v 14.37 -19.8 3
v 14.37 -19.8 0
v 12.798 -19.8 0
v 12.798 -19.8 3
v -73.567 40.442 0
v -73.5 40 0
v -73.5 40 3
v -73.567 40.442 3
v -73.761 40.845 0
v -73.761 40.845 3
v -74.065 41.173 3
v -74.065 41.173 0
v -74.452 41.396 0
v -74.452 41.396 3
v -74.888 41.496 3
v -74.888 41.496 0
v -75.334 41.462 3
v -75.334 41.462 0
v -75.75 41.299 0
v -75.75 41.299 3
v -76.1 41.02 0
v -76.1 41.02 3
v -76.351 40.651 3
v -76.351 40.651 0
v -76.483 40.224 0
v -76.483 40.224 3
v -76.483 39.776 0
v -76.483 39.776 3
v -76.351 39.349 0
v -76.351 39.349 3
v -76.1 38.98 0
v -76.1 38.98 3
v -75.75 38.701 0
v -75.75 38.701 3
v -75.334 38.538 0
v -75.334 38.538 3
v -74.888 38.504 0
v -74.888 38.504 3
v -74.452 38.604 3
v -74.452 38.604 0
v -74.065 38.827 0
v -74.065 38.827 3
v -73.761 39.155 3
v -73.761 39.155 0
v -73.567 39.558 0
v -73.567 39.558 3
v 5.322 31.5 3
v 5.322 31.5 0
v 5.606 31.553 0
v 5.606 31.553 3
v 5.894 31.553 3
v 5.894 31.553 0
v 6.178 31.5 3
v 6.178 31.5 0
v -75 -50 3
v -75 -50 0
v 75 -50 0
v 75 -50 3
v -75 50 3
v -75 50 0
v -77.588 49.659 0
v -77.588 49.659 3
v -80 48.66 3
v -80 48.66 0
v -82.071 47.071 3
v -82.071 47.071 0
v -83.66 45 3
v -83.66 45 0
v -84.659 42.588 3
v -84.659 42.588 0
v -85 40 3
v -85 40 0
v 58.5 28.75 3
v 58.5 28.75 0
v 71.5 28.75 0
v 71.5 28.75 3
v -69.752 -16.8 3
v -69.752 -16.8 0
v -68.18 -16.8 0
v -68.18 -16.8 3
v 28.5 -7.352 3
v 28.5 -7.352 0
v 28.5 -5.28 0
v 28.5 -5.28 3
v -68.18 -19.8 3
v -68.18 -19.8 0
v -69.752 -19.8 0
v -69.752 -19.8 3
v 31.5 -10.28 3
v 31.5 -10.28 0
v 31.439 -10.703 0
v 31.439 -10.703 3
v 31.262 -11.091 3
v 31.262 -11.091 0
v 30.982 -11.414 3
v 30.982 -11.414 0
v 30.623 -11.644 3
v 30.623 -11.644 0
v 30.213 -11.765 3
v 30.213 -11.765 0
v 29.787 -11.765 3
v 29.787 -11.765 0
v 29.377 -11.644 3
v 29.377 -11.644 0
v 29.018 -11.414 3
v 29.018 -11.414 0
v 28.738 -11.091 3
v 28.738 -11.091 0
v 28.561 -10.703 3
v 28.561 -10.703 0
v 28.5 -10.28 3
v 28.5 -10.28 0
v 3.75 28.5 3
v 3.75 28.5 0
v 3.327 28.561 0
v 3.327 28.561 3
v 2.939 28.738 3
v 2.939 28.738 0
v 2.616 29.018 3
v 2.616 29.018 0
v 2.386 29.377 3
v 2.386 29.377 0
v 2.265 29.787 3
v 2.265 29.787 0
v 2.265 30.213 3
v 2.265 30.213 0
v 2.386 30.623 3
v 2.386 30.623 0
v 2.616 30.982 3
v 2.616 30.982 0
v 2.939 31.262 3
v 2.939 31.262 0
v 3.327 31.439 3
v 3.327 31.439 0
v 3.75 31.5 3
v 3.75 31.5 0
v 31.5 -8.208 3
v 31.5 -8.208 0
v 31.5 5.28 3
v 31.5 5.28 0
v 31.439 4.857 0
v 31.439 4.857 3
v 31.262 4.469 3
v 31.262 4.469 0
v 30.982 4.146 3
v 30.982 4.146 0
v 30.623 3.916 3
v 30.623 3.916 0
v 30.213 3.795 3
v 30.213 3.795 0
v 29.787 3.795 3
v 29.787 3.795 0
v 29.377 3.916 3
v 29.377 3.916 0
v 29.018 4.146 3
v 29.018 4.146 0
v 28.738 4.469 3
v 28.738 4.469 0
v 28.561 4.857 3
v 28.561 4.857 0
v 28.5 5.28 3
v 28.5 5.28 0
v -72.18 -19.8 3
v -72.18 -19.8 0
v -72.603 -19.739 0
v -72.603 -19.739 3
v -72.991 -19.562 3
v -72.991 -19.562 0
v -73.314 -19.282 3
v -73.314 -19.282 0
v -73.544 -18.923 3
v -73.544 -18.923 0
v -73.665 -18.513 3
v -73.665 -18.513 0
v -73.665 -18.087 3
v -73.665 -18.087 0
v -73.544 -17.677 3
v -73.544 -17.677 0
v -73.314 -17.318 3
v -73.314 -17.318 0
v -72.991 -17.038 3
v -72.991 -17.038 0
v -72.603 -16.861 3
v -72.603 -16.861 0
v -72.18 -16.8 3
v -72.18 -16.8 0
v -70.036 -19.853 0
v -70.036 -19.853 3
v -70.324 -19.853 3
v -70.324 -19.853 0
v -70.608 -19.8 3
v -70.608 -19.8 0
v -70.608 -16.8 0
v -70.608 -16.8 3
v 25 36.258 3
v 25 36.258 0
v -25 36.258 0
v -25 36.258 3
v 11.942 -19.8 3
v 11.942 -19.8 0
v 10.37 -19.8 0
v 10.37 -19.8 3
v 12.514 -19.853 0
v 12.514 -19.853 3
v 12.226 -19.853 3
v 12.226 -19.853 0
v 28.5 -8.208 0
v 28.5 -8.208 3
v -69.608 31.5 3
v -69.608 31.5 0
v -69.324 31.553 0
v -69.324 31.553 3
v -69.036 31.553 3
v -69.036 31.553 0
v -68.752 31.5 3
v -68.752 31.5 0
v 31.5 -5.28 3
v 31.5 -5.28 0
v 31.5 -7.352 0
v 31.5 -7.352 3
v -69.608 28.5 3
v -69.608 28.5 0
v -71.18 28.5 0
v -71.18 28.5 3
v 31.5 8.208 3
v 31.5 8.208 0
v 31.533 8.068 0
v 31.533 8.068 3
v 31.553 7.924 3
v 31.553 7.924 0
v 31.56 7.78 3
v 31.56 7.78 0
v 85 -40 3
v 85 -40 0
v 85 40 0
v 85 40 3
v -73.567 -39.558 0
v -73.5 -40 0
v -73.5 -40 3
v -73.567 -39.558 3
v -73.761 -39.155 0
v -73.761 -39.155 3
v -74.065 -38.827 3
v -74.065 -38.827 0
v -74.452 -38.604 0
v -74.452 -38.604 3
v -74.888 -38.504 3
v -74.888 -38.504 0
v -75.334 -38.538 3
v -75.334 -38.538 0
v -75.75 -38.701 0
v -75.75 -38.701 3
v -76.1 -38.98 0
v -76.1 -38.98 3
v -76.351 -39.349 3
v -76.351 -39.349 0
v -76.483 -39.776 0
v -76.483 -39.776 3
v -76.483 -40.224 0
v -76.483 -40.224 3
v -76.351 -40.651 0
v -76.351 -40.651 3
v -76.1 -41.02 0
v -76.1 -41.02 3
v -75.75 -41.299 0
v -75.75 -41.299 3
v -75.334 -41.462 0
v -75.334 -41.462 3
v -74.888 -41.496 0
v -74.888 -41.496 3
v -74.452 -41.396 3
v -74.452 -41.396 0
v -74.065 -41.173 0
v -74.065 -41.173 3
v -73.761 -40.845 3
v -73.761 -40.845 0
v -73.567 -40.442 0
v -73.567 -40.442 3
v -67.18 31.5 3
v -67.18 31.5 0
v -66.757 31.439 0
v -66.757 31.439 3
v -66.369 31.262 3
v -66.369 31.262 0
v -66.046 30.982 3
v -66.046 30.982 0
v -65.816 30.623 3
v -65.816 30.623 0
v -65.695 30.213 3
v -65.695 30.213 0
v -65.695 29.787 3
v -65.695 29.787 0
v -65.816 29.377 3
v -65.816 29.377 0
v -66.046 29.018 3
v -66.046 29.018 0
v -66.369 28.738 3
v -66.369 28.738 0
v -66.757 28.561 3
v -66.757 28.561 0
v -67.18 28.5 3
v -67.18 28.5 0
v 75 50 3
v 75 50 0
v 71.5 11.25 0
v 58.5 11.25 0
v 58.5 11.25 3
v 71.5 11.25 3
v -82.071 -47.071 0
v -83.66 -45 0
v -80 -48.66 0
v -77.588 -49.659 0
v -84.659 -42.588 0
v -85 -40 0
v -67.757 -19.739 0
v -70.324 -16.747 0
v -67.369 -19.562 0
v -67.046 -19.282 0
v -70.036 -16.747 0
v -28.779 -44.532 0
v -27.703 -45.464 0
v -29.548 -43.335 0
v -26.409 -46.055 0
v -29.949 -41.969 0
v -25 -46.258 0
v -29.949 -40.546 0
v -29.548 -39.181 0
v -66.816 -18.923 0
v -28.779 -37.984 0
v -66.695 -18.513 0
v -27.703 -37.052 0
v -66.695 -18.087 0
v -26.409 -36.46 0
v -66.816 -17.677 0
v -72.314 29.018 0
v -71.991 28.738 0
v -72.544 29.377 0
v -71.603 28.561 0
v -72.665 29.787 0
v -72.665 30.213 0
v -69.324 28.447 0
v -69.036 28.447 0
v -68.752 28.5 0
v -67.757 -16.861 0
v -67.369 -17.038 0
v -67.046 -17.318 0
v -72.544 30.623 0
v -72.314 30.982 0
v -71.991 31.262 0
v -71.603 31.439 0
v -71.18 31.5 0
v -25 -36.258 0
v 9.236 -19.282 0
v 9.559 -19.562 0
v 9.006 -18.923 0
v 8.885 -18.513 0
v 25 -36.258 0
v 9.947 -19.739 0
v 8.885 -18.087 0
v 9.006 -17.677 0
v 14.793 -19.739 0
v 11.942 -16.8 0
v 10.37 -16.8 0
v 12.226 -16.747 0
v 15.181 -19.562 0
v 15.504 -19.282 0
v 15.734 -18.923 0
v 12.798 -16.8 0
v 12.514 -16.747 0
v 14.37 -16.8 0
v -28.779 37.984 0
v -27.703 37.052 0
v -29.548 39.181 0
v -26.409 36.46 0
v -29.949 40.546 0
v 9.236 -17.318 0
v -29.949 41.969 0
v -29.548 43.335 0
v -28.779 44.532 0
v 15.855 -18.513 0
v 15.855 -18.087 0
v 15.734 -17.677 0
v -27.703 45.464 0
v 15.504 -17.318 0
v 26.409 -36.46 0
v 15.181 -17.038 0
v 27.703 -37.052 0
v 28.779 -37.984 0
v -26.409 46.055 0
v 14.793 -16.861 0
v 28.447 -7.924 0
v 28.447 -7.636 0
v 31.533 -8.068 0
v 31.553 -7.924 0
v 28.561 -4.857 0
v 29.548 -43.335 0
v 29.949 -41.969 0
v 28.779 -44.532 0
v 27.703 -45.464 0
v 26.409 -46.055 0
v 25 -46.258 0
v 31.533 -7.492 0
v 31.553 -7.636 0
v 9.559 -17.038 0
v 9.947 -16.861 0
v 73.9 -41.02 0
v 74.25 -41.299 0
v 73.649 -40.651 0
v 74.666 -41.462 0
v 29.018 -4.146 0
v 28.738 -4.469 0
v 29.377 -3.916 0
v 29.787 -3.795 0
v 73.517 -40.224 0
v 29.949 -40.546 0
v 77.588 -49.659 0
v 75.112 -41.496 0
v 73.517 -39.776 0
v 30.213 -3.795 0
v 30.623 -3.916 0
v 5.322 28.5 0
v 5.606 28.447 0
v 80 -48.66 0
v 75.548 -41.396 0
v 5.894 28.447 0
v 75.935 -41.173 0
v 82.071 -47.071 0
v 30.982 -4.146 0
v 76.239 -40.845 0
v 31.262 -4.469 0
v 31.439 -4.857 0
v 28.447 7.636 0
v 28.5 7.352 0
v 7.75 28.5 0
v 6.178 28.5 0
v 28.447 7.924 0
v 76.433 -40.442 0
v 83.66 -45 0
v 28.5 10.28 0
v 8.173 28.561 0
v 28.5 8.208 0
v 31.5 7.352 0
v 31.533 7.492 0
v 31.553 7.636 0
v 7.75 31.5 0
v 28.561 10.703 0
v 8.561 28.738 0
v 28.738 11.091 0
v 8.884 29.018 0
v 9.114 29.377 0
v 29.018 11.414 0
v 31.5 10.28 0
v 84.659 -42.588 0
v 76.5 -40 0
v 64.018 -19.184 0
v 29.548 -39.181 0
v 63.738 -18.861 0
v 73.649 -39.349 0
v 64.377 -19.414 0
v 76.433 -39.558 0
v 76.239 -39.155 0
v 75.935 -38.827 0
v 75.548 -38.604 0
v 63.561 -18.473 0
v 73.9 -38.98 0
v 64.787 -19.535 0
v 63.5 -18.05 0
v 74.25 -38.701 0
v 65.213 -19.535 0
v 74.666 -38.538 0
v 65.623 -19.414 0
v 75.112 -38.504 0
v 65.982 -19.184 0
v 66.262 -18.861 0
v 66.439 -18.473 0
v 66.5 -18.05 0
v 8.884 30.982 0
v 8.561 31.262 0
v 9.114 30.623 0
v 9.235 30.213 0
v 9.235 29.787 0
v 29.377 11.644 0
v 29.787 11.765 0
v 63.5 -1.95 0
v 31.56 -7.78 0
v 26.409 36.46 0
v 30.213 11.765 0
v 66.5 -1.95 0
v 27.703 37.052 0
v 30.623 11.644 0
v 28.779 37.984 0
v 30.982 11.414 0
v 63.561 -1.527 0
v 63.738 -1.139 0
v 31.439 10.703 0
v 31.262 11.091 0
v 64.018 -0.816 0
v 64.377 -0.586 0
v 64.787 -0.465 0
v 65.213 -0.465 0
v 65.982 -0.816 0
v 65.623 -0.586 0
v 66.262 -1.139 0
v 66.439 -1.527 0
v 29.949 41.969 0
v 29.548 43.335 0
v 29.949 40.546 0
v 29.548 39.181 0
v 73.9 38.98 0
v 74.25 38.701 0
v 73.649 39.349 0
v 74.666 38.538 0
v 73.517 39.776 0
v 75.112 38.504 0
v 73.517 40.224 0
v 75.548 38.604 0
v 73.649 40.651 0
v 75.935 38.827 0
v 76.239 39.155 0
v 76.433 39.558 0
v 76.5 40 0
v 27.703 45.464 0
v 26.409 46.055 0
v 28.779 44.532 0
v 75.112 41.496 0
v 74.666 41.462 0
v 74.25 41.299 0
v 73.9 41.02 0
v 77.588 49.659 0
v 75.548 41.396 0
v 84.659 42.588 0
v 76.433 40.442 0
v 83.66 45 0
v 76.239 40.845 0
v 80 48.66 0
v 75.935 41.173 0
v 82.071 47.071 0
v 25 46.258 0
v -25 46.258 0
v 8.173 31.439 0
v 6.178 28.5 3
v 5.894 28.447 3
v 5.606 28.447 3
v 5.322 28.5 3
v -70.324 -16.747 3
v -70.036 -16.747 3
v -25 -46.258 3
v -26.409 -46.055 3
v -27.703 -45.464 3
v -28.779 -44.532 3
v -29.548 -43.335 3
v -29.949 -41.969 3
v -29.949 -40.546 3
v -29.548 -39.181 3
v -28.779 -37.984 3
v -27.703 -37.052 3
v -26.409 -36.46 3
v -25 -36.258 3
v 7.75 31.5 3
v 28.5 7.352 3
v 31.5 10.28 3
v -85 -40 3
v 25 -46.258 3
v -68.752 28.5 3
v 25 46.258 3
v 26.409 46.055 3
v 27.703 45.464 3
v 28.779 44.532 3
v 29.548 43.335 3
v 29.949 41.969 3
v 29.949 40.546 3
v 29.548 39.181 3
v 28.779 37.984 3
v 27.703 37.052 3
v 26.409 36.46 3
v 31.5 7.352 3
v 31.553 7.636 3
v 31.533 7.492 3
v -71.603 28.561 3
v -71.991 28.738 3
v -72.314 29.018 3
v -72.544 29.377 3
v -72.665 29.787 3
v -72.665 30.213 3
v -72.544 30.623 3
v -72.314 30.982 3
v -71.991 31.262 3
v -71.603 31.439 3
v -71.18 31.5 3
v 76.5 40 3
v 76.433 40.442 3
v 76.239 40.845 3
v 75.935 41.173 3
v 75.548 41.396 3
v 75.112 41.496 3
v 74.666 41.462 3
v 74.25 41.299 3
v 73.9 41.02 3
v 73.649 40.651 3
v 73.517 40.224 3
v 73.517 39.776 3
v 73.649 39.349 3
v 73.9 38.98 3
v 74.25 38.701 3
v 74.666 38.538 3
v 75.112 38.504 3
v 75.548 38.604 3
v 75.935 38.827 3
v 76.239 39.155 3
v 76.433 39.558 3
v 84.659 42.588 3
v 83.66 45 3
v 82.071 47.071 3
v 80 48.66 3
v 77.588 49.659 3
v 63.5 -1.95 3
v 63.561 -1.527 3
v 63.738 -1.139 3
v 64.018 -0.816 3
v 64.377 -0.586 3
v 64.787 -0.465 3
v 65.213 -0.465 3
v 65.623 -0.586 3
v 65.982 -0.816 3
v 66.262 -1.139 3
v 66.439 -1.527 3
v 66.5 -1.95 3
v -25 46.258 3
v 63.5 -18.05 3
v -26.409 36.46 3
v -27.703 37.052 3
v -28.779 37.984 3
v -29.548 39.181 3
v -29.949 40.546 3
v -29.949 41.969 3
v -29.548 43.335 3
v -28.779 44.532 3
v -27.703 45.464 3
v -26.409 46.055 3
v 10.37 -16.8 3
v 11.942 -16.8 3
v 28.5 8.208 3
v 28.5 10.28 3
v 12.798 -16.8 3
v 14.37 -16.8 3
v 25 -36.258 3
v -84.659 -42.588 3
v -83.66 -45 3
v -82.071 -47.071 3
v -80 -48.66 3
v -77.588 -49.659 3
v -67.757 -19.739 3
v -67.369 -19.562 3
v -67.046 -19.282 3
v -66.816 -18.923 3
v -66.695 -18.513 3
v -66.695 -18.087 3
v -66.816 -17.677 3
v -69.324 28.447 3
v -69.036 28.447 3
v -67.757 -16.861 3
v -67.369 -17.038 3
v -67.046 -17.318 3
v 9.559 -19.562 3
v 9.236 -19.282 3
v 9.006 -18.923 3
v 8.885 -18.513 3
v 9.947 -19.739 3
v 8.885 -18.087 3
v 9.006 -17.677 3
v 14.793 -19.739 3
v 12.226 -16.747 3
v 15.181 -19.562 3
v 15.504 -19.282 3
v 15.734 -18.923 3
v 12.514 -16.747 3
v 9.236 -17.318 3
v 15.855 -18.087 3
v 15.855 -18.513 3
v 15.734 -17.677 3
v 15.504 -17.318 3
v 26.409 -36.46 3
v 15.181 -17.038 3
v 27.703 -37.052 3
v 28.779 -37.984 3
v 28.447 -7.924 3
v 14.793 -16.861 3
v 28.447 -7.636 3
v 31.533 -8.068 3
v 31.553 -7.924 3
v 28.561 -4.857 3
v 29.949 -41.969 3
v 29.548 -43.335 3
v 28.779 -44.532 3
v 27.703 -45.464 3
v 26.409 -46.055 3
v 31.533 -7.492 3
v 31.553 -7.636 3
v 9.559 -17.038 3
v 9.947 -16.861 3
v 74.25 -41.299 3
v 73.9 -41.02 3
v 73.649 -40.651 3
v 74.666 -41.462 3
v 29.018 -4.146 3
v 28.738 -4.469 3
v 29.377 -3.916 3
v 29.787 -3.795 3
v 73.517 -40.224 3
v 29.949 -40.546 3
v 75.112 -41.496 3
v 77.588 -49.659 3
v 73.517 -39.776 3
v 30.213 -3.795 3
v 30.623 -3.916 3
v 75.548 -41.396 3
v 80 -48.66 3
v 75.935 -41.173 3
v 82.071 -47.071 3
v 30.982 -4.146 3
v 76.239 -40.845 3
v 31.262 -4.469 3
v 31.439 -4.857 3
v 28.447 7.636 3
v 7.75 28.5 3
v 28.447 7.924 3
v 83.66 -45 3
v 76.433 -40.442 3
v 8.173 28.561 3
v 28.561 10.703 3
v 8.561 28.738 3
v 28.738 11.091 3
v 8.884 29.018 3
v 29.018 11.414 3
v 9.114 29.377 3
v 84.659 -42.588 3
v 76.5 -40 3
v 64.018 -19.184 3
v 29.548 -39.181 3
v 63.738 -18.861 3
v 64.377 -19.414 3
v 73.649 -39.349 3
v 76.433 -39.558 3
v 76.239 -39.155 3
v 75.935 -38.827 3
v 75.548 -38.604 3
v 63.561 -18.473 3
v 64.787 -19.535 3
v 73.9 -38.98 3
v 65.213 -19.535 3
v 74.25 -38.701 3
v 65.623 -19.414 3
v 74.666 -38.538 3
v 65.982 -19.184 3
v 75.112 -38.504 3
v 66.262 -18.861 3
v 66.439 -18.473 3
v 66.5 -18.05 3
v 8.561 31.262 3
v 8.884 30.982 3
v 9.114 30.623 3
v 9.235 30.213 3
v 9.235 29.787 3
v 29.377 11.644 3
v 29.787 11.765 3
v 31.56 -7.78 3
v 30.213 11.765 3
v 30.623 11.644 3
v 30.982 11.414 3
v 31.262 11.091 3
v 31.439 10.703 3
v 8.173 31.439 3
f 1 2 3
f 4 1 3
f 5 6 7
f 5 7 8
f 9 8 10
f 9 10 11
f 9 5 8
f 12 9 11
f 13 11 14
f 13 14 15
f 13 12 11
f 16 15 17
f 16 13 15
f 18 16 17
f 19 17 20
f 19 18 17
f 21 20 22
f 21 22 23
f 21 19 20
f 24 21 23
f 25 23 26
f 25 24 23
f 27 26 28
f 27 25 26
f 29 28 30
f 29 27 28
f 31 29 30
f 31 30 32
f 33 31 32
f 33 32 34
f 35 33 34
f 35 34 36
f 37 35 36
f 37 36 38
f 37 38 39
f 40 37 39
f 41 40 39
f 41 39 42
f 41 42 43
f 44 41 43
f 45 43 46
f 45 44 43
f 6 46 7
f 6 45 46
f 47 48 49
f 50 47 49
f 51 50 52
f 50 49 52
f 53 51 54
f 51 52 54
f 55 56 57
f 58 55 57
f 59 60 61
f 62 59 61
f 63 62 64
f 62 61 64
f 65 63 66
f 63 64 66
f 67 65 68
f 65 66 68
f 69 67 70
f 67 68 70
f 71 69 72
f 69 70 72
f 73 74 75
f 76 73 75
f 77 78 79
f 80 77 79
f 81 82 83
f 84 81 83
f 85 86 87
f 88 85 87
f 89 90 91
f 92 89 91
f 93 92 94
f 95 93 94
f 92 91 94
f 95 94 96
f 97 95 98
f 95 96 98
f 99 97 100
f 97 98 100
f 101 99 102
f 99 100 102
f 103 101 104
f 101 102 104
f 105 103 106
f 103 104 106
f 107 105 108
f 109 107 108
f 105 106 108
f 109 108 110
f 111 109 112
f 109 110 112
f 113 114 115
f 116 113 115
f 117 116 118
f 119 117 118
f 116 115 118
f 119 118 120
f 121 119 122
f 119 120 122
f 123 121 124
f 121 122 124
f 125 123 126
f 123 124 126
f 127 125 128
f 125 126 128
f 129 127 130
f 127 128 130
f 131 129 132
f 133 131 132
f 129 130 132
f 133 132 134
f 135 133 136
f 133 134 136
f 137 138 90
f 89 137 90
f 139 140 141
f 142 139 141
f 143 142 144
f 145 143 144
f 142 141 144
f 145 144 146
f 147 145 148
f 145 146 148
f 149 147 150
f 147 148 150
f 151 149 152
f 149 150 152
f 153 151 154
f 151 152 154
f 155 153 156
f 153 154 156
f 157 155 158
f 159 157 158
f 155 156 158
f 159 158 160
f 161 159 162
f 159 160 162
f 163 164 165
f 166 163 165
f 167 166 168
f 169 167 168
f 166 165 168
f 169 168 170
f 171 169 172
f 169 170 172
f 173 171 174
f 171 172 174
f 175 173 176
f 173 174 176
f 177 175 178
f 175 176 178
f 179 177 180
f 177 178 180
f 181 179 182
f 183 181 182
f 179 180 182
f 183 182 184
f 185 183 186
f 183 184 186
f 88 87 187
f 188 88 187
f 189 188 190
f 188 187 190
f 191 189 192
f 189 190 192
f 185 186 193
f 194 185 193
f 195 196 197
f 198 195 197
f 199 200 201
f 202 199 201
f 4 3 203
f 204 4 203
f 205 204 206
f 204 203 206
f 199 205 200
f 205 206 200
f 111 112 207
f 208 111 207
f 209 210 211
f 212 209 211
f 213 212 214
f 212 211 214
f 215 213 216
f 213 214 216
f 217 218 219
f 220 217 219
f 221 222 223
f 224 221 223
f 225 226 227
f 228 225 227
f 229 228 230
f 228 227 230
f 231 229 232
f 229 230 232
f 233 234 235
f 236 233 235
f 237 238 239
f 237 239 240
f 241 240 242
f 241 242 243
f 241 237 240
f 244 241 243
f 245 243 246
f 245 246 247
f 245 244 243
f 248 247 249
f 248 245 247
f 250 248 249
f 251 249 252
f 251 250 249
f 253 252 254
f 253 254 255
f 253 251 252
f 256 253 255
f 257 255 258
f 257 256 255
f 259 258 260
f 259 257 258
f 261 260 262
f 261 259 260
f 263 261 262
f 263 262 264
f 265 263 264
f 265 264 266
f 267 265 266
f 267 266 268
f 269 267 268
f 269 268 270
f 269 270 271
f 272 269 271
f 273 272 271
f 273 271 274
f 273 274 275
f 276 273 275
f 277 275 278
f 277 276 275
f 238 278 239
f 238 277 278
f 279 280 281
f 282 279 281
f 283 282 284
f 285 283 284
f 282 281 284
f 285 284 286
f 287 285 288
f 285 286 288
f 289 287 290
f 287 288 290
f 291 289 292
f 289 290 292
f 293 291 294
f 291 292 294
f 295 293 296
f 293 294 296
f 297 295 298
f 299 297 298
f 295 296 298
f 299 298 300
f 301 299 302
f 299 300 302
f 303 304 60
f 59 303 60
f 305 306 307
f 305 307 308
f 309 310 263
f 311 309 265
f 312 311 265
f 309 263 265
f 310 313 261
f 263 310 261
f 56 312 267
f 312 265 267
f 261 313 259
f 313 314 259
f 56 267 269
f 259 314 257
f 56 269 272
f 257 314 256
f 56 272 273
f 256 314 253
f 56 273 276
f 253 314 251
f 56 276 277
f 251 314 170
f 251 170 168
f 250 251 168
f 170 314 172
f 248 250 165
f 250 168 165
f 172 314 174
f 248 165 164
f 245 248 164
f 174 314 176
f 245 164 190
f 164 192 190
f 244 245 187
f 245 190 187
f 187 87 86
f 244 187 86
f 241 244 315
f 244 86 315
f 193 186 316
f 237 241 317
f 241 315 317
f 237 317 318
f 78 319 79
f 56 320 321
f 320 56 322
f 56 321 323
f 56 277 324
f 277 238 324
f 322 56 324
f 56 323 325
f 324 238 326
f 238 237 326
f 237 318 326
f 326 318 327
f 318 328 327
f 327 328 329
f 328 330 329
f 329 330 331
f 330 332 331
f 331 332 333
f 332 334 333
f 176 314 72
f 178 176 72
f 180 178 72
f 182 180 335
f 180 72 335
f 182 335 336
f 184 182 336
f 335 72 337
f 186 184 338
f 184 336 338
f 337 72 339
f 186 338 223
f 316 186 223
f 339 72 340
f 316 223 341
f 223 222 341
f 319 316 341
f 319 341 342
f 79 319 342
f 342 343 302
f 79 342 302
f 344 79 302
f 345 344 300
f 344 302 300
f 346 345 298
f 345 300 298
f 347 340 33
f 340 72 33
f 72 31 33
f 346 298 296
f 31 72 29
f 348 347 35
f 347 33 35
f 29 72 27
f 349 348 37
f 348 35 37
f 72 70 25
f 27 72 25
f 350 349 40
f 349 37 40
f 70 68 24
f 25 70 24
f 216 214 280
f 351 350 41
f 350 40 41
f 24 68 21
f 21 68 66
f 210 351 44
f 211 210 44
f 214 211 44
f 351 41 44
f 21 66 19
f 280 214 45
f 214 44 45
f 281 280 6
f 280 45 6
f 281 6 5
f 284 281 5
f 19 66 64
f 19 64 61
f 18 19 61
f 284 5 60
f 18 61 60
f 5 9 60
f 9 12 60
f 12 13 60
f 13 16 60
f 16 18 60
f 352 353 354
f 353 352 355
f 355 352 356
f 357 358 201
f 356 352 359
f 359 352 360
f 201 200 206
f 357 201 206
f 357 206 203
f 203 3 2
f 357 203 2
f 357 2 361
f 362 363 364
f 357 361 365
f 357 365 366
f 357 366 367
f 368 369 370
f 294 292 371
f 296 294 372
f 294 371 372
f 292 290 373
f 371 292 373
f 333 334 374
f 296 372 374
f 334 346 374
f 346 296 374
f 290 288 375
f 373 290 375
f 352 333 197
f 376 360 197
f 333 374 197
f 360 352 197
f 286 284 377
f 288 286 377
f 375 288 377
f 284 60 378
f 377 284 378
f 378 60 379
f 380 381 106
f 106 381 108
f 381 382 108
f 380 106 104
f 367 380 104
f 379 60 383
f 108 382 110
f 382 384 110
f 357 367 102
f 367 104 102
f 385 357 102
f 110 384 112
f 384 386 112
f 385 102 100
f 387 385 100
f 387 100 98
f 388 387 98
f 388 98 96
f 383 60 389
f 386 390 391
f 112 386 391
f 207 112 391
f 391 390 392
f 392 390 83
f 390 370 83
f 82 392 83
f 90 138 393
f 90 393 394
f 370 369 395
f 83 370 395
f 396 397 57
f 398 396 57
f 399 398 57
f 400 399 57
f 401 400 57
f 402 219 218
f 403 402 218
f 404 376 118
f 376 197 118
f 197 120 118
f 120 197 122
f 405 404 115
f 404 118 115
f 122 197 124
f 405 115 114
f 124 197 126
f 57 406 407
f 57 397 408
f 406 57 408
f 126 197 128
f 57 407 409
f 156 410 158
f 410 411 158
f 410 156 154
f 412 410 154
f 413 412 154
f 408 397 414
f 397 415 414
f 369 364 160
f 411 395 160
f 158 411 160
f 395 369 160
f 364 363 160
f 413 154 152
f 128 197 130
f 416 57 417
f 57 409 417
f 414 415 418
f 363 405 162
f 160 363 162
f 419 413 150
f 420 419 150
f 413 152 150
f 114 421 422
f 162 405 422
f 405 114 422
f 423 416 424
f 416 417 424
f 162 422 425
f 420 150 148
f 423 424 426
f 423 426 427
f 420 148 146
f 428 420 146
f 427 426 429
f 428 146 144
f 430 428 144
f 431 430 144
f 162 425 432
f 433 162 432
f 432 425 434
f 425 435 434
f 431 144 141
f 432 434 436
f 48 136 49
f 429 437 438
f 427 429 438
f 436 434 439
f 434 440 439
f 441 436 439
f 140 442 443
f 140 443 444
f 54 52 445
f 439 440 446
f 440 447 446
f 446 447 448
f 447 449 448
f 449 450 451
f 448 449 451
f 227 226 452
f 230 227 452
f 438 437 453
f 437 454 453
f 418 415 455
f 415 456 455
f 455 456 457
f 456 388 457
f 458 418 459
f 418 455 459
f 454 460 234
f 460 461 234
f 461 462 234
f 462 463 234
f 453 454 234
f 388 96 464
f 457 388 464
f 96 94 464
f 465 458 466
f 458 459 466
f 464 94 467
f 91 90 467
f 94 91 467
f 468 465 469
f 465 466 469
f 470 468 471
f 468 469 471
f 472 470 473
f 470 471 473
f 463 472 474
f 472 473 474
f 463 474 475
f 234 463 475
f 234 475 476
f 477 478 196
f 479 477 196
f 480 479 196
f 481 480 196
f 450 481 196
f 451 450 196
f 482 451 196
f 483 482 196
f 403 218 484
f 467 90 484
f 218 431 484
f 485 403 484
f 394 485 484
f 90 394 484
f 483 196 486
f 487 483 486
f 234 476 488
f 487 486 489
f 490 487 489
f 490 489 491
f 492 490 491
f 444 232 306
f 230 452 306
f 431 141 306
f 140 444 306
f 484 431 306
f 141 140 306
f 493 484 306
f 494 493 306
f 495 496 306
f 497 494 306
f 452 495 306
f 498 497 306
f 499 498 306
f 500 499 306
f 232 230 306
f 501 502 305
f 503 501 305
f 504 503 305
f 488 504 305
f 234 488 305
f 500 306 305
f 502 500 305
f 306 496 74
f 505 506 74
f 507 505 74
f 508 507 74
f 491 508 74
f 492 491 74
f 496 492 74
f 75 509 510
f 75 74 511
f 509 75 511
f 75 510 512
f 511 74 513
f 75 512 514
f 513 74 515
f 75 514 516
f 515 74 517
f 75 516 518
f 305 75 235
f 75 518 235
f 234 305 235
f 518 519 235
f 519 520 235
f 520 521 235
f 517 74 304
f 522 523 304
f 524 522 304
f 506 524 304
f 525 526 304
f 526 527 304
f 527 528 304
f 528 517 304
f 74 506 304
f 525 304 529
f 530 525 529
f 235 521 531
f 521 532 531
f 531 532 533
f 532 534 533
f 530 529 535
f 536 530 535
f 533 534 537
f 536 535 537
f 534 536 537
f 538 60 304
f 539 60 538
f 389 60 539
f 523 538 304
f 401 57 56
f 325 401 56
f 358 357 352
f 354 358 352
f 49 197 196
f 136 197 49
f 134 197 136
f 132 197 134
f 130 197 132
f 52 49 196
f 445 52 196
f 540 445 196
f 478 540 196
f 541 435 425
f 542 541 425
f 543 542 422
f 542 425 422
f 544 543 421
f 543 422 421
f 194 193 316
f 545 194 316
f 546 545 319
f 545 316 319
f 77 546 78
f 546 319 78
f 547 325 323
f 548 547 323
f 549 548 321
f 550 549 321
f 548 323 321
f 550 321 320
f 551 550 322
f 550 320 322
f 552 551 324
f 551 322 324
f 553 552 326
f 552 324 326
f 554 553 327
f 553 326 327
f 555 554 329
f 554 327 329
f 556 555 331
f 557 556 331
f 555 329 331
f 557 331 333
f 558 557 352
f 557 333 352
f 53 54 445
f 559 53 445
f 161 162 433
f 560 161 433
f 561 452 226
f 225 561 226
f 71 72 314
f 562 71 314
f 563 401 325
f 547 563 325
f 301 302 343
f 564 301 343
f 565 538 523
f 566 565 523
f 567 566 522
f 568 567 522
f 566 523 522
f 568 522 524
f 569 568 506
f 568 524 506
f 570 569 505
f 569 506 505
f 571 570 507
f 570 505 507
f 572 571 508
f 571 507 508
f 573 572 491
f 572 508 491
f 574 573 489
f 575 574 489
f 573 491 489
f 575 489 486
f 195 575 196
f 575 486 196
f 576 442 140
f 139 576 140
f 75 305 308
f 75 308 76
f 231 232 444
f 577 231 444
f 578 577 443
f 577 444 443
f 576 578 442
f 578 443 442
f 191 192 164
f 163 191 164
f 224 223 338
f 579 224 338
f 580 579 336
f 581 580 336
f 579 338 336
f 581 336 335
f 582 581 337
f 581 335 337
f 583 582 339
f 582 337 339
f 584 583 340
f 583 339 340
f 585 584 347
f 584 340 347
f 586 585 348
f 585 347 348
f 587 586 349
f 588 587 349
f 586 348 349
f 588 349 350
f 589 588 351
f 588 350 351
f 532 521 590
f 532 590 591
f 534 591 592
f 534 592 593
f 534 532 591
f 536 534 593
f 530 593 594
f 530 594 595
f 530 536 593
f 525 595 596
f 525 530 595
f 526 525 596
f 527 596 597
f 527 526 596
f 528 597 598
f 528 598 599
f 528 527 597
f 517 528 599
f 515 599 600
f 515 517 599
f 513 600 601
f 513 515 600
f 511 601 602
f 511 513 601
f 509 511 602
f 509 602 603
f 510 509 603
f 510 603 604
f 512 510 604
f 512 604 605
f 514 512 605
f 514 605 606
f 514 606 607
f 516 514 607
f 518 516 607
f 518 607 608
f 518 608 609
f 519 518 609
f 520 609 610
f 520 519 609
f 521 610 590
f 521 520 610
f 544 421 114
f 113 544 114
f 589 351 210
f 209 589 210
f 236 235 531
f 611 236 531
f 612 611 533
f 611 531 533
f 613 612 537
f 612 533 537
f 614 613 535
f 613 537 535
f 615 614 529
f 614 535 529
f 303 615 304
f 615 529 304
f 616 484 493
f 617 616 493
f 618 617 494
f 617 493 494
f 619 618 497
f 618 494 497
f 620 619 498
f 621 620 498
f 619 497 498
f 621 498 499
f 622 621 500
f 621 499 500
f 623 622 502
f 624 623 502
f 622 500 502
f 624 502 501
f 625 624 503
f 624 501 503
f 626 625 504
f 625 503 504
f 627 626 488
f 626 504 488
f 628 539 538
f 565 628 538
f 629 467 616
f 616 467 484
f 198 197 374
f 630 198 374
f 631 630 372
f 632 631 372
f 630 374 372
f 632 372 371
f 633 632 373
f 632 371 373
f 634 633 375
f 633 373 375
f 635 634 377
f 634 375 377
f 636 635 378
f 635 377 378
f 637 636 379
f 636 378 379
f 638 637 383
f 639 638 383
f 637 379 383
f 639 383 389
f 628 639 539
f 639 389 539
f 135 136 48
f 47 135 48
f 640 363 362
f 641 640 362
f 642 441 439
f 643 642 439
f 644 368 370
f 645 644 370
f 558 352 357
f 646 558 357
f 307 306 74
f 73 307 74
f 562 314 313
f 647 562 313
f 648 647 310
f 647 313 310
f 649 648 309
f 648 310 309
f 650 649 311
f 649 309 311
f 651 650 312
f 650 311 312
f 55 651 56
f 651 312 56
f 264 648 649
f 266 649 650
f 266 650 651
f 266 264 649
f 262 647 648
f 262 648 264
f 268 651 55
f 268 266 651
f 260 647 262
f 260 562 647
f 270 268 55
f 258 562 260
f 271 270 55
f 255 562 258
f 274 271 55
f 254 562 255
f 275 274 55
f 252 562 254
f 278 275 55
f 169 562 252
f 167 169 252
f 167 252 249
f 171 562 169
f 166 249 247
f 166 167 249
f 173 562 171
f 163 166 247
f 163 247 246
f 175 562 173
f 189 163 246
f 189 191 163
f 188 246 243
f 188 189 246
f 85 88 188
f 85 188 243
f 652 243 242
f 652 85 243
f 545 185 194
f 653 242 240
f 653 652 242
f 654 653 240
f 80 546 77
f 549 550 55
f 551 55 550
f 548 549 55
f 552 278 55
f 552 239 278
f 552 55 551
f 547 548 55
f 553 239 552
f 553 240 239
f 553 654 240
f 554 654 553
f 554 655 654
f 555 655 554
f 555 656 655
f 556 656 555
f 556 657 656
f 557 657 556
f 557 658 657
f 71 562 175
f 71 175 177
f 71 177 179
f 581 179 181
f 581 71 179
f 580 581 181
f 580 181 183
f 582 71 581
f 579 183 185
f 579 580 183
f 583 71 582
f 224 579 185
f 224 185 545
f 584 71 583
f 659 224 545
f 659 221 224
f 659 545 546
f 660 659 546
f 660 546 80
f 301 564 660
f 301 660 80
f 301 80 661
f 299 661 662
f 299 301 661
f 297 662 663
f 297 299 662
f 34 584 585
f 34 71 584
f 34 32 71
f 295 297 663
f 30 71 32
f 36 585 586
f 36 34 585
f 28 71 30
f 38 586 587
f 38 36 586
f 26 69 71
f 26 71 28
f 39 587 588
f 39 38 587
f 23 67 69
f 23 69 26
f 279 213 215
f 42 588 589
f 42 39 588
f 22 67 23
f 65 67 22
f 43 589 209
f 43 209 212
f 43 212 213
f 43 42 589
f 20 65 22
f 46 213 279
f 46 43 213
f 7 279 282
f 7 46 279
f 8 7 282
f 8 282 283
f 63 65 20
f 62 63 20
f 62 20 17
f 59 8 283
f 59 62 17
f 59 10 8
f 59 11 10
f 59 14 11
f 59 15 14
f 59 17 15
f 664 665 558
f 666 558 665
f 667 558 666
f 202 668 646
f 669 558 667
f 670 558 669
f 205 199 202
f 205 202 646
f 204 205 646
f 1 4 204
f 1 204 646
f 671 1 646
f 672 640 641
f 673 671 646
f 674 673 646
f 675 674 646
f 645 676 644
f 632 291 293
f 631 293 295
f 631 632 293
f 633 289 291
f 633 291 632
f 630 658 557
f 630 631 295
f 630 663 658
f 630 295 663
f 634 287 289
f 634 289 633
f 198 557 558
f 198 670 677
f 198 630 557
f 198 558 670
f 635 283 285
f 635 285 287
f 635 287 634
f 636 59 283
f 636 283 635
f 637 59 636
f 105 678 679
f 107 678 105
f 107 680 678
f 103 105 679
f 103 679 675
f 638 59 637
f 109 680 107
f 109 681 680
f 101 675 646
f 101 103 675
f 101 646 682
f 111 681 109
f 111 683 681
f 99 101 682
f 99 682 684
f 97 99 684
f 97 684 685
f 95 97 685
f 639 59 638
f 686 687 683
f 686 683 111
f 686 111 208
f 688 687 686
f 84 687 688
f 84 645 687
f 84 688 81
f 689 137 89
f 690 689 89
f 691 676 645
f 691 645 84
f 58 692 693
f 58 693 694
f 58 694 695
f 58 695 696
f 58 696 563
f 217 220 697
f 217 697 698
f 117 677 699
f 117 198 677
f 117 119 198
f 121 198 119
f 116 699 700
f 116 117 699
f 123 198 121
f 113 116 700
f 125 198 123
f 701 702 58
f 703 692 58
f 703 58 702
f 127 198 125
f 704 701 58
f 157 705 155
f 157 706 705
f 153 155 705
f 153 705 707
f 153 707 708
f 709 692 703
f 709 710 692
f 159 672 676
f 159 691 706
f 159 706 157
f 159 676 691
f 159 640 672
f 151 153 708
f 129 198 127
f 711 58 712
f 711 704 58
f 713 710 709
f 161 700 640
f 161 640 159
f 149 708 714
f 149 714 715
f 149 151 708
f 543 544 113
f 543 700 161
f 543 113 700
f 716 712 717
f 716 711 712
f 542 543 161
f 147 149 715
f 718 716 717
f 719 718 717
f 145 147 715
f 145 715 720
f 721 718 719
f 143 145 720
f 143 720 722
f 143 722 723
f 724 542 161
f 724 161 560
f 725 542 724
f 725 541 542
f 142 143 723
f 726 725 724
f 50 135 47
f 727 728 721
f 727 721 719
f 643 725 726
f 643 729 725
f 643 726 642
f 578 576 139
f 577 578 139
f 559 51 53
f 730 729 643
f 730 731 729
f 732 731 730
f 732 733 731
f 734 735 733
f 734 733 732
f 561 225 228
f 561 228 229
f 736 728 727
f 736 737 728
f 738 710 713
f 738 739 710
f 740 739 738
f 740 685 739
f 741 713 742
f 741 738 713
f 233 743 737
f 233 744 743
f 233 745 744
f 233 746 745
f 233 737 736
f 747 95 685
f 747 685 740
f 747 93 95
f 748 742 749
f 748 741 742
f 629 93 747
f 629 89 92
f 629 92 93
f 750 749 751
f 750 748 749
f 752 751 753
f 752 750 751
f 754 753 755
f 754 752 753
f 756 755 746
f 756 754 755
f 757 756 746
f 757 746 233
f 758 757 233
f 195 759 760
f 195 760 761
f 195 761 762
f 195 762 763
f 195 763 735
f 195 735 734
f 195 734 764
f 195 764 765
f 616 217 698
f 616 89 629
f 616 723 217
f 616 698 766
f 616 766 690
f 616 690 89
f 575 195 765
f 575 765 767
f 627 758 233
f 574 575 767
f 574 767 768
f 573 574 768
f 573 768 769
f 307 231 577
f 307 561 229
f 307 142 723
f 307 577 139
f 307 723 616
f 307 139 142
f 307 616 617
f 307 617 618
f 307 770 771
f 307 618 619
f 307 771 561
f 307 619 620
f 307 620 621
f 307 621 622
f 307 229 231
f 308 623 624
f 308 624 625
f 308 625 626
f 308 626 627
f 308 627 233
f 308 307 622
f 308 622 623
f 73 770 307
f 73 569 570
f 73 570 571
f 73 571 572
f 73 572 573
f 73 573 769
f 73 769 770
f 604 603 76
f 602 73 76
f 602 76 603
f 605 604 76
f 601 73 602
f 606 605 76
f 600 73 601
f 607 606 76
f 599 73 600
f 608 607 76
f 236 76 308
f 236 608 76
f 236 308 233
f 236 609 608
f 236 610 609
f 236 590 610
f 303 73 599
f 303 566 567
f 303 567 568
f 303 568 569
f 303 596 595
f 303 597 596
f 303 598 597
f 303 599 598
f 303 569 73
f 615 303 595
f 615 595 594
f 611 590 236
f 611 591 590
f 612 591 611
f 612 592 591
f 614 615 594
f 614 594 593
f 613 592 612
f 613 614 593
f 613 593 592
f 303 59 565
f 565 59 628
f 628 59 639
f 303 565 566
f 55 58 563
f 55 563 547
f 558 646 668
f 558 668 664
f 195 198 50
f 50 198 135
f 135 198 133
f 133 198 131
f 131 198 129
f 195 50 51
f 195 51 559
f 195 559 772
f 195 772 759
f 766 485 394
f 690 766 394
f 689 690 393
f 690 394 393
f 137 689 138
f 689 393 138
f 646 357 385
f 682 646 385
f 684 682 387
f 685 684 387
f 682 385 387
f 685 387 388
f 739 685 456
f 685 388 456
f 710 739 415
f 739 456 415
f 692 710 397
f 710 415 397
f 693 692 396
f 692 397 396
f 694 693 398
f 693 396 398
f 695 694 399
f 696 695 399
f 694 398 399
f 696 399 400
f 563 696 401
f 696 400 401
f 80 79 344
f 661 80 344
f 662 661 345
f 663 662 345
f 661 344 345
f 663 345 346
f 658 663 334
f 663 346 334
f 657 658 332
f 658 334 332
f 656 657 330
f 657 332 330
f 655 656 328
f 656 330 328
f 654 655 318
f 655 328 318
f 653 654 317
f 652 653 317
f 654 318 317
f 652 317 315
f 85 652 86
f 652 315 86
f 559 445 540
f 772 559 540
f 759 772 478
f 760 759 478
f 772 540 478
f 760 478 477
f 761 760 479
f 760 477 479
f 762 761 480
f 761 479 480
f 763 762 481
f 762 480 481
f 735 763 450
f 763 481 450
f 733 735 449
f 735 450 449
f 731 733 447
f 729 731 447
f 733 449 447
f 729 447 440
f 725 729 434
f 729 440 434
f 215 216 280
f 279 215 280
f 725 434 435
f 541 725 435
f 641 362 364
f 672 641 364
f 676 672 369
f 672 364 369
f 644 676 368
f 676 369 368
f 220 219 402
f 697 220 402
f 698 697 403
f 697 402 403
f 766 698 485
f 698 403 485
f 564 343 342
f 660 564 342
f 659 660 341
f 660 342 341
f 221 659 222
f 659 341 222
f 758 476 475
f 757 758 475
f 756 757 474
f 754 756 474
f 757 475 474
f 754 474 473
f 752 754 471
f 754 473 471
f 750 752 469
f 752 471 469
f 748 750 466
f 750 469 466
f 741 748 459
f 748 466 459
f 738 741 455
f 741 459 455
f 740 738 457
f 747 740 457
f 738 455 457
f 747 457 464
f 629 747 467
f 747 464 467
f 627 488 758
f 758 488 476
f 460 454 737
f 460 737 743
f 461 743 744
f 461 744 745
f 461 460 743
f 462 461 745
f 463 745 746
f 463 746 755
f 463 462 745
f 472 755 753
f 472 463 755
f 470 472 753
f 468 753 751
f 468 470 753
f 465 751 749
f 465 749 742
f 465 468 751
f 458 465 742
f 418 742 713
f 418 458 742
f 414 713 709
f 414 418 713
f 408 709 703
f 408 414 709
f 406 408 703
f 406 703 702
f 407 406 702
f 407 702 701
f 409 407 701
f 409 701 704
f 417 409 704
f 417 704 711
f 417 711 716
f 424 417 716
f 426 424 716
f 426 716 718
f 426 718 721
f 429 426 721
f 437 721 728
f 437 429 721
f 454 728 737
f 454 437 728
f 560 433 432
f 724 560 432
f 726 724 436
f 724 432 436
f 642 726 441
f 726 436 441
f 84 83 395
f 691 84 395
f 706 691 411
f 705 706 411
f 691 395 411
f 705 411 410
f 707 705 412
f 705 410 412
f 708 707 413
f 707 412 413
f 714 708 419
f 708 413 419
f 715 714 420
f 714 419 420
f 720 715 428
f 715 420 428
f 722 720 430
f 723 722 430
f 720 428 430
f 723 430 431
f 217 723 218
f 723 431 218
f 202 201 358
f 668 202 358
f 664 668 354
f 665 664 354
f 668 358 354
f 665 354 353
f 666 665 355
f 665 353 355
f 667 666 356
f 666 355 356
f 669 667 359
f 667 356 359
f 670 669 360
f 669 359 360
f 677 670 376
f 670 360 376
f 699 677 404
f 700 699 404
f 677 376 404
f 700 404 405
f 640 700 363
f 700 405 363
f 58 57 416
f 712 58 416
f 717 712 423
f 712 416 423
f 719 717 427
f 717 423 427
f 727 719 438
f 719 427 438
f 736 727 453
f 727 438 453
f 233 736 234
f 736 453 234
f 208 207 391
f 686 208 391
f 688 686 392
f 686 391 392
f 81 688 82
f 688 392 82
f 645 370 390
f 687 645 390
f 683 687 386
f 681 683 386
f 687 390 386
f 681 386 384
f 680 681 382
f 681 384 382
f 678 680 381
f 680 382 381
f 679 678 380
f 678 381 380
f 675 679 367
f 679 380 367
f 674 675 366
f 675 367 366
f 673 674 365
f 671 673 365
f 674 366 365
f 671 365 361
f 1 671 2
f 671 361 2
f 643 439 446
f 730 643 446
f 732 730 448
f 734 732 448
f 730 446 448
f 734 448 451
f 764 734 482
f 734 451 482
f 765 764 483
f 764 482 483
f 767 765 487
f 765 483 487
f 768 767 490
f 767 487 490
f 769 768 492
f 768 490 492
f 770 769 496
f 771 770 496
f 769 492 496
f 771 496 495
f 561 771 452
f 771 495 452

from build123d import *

# Parameters (mm, degrees)
SKETCH1_R           = 1.5
SKETCH1_W           = 13
SKETCH1_H           = 17.5
BOSS_EXTRUDE1_DEPTH = 3


with BuildPart() as part:
    # Sketch1 → Boss-Extrude1 (new body)
    with BuildSketch(Plane.XY):
        with BuildLine():
            Line((75, 50), (-75, 50))
            ThreePointArc((-75, 50), (-82.071067812, 47.071067812), (-85, 40))
            Line((-85, 40), (-85, -40))
            ThreePointArc((-85, -40), (-82.071067812, -47.071067812), (-75, -50))
            Line((-75, -50), (75, -50))
            ThreePointArc((75, -50), (82.071067812, -47.071067812), (85, -40))
            Line((85, -40), (85, 40))
            ThreePointArc((85, 40), (82.071067812, 47.071067812), (75, 50))
        make_face()
        with Locations((-75, -40)):
            Circle(SKETCH1_R, mode=Mode.SUBTRACT)
        with BuildLine():
            ThreePointArc((-72.18, -19.8), (-73.68, -18.3), (-72.18, -16.8))
            Line((-72.18, -16.8), (-70.608485706, -16.8))
            ThreePointArc((-70.608485706, -16.8), (-70.18, -16.74), (-69.751514294, -16.8))
            Line((-69.751514294, -16.8), (-68.18, -16.8))
            ThreePointArc((-68.18, -16.8), (-66.68, -18.3), (-68.18, -19.8))
            Line((-68.18, -19.8), (-69.751514294, -19.8))
            ThreePointArc((-69.751514294, -19.8), (-70.18, -19.86), (-70.608485706, -19.8))
            Line((-70.608485706, -19.8), (-72.18, -19.8))
        make_face(mode=Mode.SUBTRACT)
        with BuildLine():
            Line((25, -46.257829906), (-25, -46.257829906))
            ThreePointArc((-25, -46.257829906), (-30, -41.257829906), (-25, -36.257829906))
            Line((-25, -36.257829906), (25, -36.257829906))
            ThreePointArc((25, -36.257829906), (30, -41.257829906), (25, -46.257829906))
        make_face(mode=Mode.SUBTRACT)
        with Locations((75, -40)):
            Circle(SKETCH1_R, mode=Mode.SUBTRACT)
        with BuildLine():
            ThreePointArc((10.37, -19.8), (8.87, -18.3), (10.37, -16.8))
            Line((10.37, -16.8), (11.941514294, -16.8))
            ThreePointArc((11.941514294, -16.8), (12.37, -16.74), (12.798485706, -16.8))
            Line((12.798485706, -16.8), (14.37, -16.8))
            ThreePointArc((14.37, -16.8), (15.87, -18.3), (14.37, -19.8))
            Line((14.37, -19.8), (12.798485706, -19.8))
            ThreePointArc((12.798485706, -19.8), (12.37, -19.86), (11.941514294, -19.8))
            Line((11.941514294, -19.8), (10.37, -19.8))
        make_face(mode=Mode.SUBTRACT)
        with BuildLine():
            Line((28.5, -7.351514294), (28.5, -5.28))
            ThreePointArc((28.5, -5.28), (30, -3.78), (31.5, -5.28))
            Line((31.5, -5.28), (31.5, -7.351514294))
            ThreePointArc((31.5, -7.351514294), (31.544927183, -7.563666923), (31.56, -7.78))
            ThreePointArc((31.56, -7.78), (31.544927183, -7.996333077), (31.5, -8.208485706))
            Line((31.5, -8.208485706), (31.5, -10.28))
            ThreePointArc((31.5, -10.28), (30, -11.78), (28.5, -10.28))
            Line((28.5, -10.28), (28.5, -8.208485706))
            ThreePointArc((28.5, -8.208485706), (28.44, -7.78), (28.5, -7.351514294))
        make_face(mode=Mode.SUBTRACT)
        with BuildLine():
            ThreePointArc((63.5, -1.95), (65, -0.45), (66.5, -1.95))
            Line((66.5, -1.95), (66.5, -18.05))
            ThreePointArc((66.5, -18.05), (65, -19.55), (63.5, -18.05))
            Line((63.5, -18.05), (63.5, -1.95))
        make_face(mode=Mode.SUBTRACT)
        with BuildLine():
            ThreePointArc((-67.18, 31.5), (-65.68, 30), (-67.18, 28.5))
            Line((-67.18, 28.5), (-68.751514294, 28.5))
            ThreePointArc((-68.751514294, 28.5), (-69.18, 28.44), (-69.608485706, 28.5))
            Line((-69.608485706, 28.5), (-71.18, 28.5))
            ThreePointArc((-71.18, 28.5), (-72.68, 30), (-71.18, 31.5))
            Line((-71.18, 31.5), (-69.608485706, 31.5))
            ThreePointArc((-69.608485706, 31.5), (-69.18, 31.56), (-68.751514294, 31.5))
            Line((-68.751514294, 31.5), (-67.18, 31.5))
        make_face(mode=Mode.SUBTRACT)
        with Locations((-75, 40)):
            Circle(SKETCH1_R, mode=Mode.SUBTRACT)
        with BuildLine():
            ThreePointArc((31.5, 5.28), (30, 3.78), (28.5, 5.28))
            Line((28.5, 5.28), (28.5, 7.351514294))
            ThreePointArc((28.5, 7.351514294), (28.44, 7.78), (28.5, 8.208485706))
            Line((28.5, 8.208485706), (28.5, 10.28))
            ThreePointArc((28.5, 10.28), (30, 11.78), (31.5, 10.28))
            Line((31.5, 10.28), (31.5, 8.208485706))
            ThreePointArc((31.5, 8.208485706), (31.544927183, 7.996333077), (31.56, 7.78))
            ThreePointArc((31.56, 7.78), (31.544927183, 7.563666923), (31.5, 7.351514294))
            Line((31.5, 7.351514294), (31.5, 5.28))
        make_face(mode=Mode.SUBTRACT)
        with Locations((65, 20)):
            Rectangle(SKETCH1_W, SKETCH1_H, mode=Mode.SUBTRACT)
        with BuildLine():
            ThreePointArc((3.75, 28.5), (2.25, 30), (3.75, 31.5))
            Line((3.75, 31.5), (5.321514294, 31.5))
            ThreePointArc((5.321514294, 31.5), (5.75, 31.56), (6.178485706, 31.5))
            Line((6.178485706, 31.5), (7.75, 31.5))
            ThreePointArc((7.75, 31.5), (9.25, 30), (7.75, 28.5))
            Line((7.75, 28.5), (6.178485706, 28.5))
            ThreePointArc((6.178485706, 28.5), (5.75, 28.44), (5.321514294, 28.5))
            Line((5.321514294, 28.5), (3.75, 28.5))
        make_face(mode=Mode.SUBTRACT)
        with BuildLine():
            ThreePointArc((-25, 36.257829906), (-30, 41.257829906), (-25, 46.257829906))
            Line((-25, 46.257829906), (25, 46.257829906))
            ThreePointArc((25, 46.257829906), (30, 41.257829906), (25, 36.257829906))
            Line((25, 36.257829906), (-25, 36.257829906))
        make_face(mode=Mode.SUBTRACT)
        with Locations((75, 40)):
            Circle(SKETCH1_R, mode=Mode.SUBTRACT)
    extrude(amount=BOSS_EXTRUDE1_DEPTH)


solid = part.part
